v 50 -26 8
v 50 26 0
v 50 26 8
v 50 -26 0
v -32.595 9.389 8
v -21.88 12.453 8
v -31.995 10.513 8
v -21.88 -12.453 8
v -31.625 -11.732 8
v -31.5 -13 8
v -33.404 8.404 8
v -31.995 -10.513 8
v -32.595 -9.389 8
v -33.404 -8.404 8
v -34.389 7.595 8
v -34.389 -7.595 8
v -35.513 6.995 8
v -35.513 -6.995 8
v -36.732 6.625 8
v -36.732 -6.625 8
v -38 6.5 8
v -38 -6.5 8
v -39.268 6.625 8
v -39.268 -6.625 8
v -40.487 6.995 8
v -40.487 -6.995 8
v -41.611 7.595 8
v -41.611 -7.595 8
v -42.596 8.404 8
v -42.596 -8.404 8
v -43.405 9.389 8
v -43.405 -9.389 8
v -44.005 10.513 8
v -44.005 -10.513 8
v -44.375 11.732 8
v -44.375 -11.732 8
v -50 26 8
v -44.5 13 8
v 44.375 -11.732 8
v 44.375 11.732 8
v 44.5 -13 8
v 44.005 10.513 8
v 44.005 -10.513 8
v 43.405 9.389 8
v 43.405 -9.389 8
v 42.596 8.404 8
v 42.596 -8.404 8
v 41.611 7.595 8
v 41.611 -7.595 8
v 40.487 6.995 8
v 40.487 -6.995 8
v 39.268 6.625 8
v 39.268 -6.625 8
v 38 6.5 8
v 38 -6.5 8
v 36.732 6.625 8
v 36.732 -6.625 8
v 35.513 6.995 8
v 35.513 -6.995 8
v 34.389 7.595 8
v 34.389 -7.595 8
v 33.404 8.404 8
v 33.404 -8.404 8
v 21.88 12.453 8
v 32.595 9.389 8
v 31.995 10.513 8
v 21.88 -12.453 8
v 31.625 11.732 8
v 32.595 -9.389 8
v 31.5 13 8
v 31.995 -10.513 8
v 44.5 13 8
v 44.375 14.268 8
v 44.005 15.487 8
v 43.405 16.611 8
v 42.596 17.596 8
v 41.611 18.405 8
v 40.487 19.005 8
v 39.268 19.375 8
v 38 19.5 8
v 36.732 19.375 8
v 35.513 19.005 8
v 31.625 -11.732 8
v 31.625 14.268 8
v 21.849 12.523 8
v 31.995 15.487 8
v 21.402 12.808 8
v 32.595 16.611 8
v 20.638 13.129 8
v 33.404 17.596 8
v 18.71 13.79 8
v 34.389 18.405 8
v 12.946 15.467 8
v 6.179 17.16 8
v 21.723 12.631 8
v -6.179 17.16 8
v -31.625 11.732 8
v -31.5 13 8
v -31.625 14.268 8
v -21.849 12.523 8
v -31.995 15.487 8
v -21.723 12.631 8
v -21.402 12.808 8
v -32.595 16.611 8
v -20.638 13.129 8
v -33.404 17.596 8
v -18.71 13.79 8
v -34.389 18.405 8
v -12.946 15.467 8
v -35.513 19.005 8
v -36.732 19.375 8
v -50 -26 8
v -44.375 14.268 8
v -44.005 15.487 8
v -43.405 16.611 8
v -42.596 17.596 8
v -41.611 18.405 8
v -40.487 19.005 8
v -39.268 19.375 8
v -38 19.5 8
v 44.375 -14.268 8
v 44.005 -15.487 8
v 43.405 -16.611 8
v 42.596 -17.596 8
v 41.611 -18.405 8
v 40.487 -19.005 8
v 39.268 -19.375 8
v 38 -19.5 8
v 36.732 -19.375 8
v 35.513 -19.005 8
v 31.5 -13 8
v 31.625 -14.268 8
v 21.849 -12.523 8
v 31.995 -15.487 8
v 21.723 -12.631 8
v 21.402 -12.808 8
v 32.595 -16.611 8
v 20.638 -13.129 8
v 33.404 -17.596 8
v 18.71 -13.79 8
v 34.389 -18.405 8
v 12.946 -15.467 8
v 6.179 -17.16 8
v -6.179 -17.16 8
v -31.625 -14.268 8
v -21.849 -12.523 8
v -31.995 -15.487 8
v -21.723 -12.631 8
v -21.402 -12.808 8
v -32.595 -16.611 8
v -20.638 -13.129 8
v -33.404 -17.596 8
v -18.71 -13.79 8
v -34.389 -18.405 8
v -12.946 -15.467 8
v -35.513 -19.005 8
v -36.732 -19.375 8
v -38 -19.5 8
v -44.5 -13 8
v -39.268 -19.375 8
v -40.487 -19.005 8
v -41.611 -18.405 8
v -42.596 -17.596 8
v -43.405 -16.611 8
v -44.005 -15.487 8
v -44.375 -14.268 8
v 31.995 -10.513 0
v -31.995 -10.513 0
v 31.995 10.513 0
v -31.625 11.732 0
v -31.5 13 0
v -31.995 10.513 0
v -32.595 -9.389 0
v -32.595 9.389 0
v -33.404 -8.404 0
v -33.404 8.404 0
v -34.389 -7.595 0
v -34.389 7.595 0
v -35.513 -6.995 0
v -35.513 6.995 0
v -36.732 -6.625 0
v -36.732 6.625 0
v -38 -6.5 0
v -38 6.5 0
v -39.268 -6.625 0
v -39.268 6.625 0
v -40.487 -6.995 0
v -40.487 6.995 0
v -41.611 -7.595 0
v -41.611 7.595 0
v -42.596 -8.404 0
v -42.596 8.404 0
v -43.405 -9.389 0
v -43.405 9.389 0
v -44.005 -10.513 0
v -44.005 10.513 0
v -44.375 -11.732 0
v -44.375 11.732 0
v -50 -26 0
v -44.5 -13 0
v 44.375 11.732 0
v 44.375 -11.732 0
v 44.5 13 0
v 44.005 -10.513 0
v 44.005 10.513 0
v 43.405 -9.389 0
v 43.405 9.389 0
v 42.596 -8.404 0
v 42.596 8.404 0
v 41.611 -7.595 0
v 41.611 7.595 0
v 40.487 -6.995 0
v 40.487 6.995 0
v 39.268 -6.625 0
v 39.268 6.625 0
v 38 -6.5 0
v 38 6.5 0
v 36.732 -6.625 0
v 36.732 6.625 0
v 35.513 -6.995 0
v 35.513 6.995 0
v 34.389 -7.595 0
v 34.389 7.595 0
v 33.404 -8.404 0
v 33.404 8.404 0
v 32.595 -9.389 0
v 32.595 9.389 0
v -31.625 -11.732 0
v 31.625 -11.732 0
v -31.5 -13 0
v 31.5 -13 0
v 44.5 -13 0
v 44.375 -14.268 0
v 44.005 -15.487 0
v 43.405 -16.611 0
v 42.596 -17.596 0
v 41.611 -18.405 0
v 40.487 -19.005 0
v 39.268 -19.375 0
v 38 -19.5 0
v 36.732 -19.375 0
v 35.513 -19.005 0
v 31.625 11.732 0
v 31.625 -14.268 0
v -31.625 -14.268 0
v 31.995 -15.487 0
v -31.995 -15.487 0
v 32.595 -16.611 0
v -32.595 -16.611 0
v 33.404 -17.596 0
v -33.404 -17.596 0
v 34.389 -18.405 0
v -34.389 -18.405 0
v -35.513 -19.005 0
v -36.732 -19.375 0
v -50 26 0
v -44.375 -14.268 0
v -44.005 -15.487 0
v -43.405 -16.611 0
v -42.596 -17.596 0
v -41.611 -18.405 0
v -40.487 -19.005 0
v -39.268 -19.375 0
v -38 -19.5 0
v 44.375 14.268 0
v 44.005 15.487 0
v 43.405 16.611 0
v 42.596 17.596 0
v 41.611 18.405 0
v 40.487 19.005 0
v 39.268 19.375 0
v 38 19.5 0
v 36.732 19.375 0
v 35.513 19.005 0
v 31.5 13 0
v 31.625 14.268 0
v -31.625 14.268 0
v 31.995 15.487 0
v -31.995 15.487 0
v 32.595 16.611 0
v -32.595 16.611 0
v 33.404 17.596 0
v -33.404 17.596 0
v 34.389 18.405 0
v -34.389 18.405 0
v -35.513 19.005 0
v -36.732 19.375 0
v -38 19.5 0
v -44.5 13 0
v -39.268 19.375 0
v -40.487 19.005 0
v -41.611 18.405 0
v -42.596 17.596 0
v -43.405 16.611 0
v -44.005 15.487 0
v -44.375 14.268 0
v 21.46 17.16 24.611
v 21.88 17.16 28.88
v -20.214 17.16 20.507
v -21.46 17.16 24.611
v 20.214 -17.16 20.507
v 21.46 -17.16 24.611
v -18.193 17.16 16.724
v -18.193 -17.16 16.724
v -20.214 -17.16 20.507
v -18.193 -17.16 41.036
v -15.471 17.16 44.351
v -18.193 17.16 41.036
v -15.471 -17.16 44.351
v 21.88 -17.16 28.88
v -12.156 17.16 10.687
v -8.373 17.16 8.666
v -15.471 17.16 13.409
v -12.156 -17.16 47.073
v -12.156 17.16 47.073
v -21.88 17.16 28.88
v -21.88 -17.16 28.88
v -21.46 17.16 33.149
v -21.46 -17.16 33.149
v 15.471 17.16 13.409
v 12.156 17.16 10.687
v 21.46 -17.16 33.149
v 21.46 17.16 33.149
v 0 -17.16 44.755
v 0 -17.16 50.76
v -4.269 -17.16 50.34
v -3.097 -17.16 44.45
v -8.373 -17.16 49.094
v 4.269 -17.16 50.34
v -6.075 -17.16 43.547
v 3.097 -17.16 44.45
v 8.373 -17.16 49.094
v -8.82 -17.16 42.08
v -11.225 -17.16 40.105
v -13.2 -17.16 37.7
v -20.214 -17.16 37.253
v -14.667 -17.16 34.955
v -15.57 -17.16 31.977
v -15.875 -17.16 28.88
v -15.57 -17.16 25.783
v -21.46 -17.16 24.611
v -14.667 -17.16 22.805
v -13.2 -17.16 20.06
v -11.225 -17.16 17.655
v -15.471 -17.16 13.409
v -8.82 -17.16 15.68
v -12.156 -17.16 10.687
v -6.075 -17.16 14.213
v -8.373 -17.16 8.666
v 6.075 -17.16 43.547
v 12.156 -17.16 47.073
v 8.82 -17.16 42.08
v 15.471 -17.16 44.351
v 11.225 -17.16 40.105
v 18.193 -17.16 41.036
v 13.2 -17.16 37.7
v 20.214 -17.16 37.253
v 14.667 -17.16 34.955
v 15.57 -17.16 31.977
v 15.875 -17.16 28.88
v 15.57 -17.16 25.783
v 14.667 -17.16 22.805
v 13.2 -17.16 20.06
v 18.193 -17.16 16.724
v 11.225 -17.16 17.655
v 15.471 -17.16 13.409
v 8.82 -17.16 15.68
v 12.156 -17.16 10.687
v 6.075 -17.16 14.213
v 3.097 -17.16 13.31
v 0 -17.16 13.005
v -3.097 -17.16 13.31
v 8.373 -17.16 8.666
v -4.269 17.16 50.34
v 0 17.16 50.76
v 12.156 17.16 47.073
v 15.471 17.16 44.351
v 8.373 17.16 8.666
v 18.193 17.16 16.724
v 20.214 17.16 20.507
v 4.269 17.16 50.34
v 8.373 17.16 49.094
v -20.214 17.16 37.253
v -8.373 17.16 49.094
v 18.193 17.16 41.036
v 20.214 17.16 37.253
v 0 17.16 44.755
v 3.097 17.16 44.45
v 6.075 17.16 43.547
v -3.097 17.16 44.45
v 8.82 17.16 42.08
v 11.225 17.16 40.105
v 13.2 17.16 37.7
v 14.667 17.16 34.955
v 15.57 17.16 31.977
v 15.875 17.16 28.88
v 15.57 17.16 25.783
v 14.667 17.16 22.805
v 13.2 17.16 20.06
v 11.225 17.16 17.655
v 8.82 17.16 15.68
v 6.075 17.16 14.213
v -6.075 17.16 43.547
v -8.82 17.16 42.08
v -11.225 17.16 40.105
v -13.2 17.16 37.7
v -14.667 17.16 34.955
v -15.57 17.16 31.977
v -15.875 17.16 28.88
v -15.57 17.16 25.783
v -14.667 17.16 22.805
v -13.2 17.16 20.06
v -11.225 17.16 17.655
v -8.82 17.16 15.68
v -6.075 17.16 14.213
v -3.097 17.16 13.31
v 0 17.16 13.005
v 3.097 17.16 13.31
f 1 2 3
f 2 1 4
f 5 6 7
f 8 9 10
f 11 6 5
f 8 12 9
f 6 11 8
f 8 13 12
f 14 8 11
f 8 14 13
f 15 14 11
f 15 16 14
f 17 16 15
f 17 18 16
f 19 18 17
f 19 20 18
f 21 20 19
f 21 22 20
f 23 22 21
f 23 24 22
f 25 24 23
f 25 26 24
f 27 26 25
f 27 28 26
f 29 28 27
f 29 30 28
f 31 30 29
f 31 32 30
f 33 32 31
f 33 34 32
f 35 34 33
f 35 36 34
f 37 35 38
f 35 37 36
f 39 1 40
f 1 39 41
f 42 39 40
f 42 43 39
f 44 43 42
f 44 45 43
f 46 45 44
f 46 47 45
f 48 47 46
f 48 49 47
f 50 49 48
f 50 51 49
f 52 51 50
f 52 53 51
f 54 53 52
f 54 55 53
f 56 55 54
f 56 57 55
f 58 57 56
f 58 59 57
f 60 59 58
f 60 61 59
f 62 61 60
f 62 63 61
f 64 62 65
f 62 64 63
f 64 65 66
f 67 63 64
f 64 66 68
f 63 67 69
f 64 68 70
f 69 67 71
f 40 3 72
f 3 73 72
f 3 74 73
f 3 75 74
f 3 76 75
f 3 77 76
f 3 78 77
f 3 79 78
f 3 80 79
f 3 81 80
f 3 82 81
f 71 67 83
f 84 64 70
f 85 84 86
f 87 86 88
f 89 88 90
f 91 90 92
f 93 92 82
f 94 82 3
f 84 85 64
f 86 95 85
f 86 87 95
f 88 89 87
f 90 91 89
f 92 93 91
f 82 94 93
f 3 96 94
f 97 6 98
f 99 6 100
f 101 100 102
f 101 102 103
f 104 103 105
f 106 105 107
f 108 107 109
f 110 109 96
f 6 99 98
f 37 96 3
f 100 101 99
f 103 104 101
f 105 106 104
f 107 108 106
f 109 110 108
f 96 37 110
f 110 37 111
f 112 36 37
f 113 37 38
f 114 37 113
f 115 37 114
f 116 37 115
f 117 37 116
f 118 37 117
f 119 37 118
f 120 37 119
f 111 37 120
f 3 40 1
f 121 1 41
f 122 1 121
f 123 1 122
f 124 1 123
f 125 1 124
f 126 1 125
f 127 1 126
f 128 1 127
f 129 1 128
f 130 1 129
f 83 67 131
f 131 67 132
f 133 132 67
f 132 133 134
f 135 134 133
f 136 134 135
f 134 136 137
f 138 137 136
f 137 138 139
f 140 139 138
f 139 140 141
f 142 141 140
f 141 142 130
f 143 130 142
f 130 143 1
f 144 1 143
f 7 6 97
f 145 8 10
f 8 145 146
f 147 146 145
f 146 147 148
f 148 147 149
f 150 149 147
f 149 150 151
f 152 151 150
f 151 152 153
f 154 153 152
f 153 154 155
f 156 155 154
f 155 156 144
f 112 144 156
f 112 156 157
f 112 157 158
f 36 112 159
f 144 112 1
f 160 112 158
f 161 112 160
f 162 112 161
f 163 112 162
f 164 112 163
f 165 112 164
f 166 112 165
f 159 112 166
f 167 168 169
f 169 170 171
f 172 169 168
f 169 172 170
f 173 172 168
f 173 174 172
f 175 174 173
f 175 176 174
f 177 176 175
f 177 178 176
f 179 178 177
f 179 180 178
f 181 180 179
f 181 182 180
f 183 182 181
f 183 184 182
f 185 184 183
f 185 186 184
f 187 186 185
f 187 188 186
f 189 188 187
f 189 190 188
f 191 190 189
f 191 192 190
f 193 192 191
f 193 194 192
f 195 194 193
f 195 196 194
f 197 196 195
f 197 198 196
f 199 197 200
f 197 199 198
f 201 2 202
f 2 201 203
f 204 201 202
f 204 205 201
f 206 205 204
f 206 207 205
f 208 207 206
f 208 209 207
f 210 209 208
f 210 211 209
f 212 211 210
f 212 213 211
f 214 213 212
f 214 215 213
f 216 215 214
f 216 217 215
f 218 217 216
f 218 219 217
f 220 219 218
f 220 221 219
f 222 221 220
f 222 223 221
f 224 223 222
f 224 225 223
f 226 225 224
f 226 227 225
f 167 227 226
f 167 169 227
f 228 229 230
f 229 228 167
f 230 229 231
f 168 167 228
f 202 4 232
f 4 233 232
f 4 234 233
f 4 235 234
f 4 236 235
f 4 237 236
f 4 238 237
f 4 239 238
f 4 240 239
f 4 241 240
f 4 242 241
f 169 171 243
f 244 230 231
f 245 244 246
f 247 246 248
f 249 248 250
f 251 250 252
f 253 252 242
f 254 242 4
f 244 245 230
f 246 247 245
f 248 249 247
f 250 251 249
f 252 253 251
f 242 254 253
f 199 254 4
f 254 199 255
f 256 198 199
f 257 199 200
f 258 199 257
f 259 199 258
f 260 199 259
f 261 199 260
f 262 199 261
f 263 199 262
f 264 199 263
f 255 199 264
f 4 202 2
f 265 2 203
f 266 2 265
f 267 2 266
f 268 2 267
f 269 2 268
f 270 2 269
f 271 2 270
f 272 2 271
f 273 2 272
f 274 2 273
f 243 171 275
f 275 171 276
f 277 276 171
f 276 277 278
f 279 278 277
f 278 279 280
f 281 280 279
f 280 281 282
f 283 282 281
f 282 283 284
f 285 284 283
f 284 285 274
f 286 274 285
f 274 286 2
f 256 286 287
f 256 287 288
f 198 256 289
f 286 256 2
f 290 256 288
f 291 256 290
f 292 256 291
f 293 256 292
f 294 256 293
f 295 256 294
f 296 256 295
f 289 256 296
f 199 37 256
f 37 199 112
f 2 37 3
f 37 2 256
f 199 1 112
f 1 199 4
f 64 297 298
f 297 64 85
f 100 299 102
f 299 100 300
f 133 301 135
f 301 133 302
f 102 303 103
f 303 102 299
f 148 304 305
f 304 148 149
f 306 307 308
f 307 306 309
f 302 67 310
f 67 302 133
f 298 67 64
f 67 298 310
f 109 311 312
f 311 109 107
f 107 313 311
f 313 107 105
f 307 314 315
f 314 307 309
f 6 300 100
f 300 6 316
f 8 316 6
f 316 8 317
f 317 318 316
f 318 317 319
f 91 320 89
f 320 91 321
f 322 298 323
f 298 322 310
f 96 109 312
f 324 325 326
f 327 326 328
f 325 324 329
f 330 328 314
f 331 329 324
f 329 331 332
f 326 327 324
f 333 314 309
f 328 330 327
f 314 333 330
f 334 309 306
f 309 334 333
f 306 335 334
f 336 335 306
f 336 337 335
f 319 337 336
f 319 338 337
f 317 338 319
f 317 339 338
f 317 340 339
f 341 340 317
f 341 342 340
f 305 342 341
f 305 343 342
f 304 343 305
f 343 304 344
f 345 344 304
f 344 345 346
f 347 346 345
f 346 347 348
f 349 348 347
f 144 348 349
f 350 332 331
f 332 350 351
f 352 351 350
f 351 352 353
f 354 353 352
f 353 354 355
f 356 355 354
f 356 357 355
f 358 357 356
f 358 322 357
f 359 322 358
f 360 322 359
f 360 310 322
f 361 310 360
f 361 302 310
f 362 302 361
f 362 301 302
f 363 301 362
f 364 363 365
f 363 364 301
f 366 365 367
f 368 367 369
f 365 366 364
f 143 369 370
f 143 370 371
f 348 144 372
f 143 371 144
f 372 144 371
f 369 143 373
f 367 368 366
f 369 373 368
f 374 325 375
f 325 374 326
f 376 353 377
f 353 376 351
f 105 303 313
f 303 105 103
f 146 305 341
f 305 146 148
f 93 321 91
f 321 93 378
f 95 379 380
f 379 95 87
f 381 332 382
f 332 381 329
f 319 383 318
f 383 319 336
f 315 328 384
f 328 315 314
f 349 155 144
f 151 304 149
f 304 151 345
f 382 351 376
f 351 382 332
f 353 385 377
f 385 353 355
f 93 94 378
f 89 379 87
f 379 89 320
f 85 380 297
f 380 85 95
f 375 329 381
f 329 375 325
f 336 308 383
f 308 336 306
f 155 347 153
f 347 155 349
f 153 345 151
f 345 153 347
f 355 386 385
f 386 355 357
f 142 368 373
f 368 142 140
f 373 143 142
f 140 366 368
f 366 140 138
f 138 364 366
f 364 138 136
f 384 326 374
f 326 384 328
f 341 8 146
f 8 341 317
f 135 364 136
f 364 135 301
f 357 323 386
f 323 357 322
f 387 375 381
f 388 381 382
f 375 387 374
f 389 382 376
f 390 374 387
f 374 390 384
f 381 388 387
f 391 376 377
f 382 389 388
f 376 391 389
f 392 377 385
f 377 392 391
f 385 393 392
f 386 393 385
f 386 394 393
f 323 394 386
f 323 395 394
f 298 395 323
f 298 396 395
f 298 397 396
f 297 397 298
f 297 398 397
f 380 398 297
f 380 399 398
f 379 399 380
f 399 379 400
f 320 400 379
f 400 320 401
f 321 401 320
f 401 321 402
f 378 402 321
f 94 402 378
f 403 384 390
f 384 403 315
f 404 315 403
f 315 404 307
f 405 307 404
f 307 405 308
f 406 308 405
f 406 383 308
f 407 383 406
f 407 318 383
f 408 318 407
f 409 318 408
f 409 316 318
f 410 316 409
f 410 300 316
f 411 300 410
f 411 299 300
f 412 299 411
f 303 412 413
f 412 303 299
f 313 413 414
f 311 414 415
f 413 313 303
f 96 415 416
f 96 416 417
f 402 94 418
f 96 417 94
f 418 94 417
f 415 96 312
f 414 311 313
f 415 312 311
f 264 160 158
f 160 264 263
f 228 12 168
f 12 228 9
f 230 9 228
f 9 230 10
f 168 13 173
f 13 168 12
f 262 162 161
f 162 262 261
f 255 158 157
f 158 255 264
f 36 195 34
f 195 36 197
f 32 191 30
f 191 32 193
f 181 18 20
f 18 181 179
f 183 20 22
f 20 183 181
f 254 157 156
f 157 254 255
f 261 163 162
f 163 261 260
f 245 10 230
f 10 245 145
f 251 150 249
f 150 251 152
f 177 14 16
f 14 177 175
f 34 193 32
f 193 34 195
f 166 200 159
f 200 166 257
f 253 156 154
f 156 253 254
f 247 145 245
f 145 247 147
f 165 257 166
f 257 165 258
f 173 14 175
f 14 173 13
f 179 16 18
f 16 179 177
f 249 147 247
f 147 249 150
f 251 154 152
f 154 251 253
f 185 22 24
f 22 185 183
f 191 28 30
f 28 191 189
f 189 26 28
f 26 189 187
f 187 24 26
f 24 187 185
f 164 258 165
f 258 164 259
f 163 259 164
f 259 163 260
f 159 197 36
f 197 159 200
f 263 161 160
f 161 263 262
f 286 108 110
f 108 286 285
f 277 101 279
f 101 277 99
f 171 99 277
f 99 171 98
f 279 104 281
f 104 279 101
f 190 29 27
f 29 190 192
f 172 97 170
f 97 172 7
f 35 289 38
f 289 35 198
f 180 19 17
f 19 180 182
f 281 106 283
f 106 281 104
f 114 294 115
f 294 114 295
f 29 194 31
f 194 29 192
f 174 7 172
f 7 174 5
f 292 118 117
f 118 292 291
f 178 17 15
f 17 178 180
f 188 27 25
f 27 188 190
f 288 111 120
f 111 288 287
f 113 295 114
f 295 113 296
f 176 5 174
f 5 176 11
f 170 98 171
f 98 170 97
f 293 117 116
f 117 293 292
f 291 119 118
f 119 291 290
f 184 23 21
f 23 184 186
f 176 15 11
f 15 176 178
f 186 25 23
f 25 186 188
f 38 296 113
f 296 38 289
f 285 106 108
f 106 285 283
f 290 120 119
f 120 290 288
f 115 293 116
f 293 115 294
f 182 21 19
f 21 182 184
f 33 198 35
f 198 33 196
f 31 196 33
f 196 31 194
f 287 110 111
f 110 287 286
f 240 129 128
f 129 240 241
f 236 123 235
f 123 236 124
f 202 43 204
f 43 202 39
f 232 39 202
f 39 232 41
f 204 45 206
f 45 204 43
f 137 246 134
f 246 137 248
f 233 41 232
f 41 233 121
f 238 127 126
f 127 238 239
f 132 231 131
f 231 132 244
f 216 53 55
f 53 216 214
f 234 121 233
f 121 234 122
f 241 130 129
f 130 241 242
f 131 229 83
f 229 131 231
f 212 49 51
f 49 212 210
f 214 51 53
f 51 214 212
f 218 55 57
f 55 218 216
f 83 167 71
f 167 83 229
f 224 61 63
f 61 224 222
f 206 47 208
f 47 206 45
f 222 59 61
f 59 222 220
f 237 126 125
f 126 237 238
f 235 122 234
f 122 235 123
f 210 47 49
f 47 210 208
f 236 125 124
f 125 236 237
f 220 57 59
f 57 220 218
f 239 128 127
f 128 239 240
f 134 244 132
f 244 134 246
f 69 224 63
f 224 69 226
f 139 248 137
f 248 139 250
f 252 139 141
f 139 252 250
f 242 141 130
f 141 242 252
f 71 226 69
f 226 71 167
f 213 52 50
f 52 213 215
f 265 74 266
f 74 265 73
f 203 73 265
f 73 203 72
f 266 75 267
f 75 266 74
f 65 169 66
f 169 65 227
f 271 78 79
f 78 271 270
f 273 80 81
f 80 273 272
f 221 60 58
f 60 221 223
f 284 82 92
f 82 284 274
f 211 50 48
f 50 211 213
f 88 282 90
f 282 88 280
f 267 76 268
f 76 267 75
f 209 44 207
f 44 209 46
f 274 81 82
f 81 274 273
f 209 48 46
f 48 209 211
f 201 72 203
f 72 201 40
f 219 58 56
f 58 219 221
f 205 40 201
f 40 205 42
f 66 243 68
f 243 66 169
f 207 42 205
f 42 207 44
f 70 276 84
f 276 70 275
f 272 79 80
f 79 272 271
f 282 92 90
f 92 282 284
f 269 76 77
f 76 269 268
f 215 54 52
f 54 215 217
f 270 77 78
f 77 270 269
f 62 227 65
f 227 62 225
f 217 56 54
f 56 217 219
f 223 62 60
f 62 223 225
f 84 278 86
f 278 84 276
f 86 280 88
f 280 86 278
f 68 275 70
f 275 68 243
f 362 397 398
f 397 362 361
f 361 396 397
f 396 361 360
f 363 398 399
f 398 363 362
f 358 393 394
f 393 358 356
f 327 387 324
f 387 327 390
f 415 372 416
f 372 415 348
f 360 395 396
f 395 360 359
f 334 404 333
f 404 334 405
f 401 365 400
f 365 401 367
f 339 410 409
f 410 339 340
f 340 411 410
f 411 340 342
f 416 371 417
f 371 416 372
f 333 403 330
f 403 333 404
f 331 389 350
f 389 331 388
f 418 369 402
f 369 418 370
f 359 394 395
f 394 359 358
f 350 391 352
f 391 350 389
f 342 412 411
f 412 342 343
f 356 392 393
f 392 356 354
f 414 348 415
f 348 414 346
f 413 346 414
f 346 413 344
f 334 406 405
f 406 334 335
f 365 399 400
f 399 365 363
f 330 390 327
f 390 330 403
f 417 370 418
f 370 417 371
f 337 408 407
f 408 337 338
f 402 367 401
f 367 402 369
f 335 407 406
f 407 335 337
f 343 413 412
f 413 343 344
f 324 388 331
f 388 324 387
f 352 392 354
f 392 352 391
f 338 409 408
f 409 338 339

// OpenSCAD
$fn = 32;

// ----------------------------------------------------------------------
// Bearing block: 100 x 52 mm base, 31.75 mm bore at 28.88 mm
// ----------------------------------------------------------------------

// --- parameters (mm) ---
base_w = 100;             // base width
base_d = 52;              // base depth
base_t = 8;               // base thickness
bore_d = 31.75;           // shaft / bearing bore
house_r = 21.88;          // housing outer radius
house_len = 34.32;        // housing length along the shaft
foot_w = 43.76;           // foot width under the housing
foot_len = 24.32;         // foot length along the shaft
axis_z = 28.88;           // bore axis height above the base
holes_d = 13;             // mounting holes
hole_x = 38;              // mounting hole spacing

difference() {
  union() {
    /* base plate with its underside on z = 0 */
    translate([0, 0, base_t / 2]) cube([base_w, base_d, base_t], center = true);
    /* hull foot: a straight web blending into the round housing */
    hull() {
      translate([0, 0, base_t - 0.5]) cube([foot_w, foot_len, 1.6], center = true);
      translate([0, 0, axis_z]) rotate([-90, 0, 0]) cylinder(h = house_len, d = 2 * house_r, center = true);
    }
  }
  /* bore through the housing, 2.5 mm clear on both sides */
  translate([0, 0, axis_z]) rotate([-90, 0, 0]) cylinder(h = house_len + 5, d = bore_d, center = true);
  /* mounting holes through the base plate */
  for (hx = [-38, 38]) {
    for (hy = [-13, 13]) {
      translate([hx, hy, -2.5]) cylinder(h = base_t + 5, d = holes_d);
    }
  }
}
